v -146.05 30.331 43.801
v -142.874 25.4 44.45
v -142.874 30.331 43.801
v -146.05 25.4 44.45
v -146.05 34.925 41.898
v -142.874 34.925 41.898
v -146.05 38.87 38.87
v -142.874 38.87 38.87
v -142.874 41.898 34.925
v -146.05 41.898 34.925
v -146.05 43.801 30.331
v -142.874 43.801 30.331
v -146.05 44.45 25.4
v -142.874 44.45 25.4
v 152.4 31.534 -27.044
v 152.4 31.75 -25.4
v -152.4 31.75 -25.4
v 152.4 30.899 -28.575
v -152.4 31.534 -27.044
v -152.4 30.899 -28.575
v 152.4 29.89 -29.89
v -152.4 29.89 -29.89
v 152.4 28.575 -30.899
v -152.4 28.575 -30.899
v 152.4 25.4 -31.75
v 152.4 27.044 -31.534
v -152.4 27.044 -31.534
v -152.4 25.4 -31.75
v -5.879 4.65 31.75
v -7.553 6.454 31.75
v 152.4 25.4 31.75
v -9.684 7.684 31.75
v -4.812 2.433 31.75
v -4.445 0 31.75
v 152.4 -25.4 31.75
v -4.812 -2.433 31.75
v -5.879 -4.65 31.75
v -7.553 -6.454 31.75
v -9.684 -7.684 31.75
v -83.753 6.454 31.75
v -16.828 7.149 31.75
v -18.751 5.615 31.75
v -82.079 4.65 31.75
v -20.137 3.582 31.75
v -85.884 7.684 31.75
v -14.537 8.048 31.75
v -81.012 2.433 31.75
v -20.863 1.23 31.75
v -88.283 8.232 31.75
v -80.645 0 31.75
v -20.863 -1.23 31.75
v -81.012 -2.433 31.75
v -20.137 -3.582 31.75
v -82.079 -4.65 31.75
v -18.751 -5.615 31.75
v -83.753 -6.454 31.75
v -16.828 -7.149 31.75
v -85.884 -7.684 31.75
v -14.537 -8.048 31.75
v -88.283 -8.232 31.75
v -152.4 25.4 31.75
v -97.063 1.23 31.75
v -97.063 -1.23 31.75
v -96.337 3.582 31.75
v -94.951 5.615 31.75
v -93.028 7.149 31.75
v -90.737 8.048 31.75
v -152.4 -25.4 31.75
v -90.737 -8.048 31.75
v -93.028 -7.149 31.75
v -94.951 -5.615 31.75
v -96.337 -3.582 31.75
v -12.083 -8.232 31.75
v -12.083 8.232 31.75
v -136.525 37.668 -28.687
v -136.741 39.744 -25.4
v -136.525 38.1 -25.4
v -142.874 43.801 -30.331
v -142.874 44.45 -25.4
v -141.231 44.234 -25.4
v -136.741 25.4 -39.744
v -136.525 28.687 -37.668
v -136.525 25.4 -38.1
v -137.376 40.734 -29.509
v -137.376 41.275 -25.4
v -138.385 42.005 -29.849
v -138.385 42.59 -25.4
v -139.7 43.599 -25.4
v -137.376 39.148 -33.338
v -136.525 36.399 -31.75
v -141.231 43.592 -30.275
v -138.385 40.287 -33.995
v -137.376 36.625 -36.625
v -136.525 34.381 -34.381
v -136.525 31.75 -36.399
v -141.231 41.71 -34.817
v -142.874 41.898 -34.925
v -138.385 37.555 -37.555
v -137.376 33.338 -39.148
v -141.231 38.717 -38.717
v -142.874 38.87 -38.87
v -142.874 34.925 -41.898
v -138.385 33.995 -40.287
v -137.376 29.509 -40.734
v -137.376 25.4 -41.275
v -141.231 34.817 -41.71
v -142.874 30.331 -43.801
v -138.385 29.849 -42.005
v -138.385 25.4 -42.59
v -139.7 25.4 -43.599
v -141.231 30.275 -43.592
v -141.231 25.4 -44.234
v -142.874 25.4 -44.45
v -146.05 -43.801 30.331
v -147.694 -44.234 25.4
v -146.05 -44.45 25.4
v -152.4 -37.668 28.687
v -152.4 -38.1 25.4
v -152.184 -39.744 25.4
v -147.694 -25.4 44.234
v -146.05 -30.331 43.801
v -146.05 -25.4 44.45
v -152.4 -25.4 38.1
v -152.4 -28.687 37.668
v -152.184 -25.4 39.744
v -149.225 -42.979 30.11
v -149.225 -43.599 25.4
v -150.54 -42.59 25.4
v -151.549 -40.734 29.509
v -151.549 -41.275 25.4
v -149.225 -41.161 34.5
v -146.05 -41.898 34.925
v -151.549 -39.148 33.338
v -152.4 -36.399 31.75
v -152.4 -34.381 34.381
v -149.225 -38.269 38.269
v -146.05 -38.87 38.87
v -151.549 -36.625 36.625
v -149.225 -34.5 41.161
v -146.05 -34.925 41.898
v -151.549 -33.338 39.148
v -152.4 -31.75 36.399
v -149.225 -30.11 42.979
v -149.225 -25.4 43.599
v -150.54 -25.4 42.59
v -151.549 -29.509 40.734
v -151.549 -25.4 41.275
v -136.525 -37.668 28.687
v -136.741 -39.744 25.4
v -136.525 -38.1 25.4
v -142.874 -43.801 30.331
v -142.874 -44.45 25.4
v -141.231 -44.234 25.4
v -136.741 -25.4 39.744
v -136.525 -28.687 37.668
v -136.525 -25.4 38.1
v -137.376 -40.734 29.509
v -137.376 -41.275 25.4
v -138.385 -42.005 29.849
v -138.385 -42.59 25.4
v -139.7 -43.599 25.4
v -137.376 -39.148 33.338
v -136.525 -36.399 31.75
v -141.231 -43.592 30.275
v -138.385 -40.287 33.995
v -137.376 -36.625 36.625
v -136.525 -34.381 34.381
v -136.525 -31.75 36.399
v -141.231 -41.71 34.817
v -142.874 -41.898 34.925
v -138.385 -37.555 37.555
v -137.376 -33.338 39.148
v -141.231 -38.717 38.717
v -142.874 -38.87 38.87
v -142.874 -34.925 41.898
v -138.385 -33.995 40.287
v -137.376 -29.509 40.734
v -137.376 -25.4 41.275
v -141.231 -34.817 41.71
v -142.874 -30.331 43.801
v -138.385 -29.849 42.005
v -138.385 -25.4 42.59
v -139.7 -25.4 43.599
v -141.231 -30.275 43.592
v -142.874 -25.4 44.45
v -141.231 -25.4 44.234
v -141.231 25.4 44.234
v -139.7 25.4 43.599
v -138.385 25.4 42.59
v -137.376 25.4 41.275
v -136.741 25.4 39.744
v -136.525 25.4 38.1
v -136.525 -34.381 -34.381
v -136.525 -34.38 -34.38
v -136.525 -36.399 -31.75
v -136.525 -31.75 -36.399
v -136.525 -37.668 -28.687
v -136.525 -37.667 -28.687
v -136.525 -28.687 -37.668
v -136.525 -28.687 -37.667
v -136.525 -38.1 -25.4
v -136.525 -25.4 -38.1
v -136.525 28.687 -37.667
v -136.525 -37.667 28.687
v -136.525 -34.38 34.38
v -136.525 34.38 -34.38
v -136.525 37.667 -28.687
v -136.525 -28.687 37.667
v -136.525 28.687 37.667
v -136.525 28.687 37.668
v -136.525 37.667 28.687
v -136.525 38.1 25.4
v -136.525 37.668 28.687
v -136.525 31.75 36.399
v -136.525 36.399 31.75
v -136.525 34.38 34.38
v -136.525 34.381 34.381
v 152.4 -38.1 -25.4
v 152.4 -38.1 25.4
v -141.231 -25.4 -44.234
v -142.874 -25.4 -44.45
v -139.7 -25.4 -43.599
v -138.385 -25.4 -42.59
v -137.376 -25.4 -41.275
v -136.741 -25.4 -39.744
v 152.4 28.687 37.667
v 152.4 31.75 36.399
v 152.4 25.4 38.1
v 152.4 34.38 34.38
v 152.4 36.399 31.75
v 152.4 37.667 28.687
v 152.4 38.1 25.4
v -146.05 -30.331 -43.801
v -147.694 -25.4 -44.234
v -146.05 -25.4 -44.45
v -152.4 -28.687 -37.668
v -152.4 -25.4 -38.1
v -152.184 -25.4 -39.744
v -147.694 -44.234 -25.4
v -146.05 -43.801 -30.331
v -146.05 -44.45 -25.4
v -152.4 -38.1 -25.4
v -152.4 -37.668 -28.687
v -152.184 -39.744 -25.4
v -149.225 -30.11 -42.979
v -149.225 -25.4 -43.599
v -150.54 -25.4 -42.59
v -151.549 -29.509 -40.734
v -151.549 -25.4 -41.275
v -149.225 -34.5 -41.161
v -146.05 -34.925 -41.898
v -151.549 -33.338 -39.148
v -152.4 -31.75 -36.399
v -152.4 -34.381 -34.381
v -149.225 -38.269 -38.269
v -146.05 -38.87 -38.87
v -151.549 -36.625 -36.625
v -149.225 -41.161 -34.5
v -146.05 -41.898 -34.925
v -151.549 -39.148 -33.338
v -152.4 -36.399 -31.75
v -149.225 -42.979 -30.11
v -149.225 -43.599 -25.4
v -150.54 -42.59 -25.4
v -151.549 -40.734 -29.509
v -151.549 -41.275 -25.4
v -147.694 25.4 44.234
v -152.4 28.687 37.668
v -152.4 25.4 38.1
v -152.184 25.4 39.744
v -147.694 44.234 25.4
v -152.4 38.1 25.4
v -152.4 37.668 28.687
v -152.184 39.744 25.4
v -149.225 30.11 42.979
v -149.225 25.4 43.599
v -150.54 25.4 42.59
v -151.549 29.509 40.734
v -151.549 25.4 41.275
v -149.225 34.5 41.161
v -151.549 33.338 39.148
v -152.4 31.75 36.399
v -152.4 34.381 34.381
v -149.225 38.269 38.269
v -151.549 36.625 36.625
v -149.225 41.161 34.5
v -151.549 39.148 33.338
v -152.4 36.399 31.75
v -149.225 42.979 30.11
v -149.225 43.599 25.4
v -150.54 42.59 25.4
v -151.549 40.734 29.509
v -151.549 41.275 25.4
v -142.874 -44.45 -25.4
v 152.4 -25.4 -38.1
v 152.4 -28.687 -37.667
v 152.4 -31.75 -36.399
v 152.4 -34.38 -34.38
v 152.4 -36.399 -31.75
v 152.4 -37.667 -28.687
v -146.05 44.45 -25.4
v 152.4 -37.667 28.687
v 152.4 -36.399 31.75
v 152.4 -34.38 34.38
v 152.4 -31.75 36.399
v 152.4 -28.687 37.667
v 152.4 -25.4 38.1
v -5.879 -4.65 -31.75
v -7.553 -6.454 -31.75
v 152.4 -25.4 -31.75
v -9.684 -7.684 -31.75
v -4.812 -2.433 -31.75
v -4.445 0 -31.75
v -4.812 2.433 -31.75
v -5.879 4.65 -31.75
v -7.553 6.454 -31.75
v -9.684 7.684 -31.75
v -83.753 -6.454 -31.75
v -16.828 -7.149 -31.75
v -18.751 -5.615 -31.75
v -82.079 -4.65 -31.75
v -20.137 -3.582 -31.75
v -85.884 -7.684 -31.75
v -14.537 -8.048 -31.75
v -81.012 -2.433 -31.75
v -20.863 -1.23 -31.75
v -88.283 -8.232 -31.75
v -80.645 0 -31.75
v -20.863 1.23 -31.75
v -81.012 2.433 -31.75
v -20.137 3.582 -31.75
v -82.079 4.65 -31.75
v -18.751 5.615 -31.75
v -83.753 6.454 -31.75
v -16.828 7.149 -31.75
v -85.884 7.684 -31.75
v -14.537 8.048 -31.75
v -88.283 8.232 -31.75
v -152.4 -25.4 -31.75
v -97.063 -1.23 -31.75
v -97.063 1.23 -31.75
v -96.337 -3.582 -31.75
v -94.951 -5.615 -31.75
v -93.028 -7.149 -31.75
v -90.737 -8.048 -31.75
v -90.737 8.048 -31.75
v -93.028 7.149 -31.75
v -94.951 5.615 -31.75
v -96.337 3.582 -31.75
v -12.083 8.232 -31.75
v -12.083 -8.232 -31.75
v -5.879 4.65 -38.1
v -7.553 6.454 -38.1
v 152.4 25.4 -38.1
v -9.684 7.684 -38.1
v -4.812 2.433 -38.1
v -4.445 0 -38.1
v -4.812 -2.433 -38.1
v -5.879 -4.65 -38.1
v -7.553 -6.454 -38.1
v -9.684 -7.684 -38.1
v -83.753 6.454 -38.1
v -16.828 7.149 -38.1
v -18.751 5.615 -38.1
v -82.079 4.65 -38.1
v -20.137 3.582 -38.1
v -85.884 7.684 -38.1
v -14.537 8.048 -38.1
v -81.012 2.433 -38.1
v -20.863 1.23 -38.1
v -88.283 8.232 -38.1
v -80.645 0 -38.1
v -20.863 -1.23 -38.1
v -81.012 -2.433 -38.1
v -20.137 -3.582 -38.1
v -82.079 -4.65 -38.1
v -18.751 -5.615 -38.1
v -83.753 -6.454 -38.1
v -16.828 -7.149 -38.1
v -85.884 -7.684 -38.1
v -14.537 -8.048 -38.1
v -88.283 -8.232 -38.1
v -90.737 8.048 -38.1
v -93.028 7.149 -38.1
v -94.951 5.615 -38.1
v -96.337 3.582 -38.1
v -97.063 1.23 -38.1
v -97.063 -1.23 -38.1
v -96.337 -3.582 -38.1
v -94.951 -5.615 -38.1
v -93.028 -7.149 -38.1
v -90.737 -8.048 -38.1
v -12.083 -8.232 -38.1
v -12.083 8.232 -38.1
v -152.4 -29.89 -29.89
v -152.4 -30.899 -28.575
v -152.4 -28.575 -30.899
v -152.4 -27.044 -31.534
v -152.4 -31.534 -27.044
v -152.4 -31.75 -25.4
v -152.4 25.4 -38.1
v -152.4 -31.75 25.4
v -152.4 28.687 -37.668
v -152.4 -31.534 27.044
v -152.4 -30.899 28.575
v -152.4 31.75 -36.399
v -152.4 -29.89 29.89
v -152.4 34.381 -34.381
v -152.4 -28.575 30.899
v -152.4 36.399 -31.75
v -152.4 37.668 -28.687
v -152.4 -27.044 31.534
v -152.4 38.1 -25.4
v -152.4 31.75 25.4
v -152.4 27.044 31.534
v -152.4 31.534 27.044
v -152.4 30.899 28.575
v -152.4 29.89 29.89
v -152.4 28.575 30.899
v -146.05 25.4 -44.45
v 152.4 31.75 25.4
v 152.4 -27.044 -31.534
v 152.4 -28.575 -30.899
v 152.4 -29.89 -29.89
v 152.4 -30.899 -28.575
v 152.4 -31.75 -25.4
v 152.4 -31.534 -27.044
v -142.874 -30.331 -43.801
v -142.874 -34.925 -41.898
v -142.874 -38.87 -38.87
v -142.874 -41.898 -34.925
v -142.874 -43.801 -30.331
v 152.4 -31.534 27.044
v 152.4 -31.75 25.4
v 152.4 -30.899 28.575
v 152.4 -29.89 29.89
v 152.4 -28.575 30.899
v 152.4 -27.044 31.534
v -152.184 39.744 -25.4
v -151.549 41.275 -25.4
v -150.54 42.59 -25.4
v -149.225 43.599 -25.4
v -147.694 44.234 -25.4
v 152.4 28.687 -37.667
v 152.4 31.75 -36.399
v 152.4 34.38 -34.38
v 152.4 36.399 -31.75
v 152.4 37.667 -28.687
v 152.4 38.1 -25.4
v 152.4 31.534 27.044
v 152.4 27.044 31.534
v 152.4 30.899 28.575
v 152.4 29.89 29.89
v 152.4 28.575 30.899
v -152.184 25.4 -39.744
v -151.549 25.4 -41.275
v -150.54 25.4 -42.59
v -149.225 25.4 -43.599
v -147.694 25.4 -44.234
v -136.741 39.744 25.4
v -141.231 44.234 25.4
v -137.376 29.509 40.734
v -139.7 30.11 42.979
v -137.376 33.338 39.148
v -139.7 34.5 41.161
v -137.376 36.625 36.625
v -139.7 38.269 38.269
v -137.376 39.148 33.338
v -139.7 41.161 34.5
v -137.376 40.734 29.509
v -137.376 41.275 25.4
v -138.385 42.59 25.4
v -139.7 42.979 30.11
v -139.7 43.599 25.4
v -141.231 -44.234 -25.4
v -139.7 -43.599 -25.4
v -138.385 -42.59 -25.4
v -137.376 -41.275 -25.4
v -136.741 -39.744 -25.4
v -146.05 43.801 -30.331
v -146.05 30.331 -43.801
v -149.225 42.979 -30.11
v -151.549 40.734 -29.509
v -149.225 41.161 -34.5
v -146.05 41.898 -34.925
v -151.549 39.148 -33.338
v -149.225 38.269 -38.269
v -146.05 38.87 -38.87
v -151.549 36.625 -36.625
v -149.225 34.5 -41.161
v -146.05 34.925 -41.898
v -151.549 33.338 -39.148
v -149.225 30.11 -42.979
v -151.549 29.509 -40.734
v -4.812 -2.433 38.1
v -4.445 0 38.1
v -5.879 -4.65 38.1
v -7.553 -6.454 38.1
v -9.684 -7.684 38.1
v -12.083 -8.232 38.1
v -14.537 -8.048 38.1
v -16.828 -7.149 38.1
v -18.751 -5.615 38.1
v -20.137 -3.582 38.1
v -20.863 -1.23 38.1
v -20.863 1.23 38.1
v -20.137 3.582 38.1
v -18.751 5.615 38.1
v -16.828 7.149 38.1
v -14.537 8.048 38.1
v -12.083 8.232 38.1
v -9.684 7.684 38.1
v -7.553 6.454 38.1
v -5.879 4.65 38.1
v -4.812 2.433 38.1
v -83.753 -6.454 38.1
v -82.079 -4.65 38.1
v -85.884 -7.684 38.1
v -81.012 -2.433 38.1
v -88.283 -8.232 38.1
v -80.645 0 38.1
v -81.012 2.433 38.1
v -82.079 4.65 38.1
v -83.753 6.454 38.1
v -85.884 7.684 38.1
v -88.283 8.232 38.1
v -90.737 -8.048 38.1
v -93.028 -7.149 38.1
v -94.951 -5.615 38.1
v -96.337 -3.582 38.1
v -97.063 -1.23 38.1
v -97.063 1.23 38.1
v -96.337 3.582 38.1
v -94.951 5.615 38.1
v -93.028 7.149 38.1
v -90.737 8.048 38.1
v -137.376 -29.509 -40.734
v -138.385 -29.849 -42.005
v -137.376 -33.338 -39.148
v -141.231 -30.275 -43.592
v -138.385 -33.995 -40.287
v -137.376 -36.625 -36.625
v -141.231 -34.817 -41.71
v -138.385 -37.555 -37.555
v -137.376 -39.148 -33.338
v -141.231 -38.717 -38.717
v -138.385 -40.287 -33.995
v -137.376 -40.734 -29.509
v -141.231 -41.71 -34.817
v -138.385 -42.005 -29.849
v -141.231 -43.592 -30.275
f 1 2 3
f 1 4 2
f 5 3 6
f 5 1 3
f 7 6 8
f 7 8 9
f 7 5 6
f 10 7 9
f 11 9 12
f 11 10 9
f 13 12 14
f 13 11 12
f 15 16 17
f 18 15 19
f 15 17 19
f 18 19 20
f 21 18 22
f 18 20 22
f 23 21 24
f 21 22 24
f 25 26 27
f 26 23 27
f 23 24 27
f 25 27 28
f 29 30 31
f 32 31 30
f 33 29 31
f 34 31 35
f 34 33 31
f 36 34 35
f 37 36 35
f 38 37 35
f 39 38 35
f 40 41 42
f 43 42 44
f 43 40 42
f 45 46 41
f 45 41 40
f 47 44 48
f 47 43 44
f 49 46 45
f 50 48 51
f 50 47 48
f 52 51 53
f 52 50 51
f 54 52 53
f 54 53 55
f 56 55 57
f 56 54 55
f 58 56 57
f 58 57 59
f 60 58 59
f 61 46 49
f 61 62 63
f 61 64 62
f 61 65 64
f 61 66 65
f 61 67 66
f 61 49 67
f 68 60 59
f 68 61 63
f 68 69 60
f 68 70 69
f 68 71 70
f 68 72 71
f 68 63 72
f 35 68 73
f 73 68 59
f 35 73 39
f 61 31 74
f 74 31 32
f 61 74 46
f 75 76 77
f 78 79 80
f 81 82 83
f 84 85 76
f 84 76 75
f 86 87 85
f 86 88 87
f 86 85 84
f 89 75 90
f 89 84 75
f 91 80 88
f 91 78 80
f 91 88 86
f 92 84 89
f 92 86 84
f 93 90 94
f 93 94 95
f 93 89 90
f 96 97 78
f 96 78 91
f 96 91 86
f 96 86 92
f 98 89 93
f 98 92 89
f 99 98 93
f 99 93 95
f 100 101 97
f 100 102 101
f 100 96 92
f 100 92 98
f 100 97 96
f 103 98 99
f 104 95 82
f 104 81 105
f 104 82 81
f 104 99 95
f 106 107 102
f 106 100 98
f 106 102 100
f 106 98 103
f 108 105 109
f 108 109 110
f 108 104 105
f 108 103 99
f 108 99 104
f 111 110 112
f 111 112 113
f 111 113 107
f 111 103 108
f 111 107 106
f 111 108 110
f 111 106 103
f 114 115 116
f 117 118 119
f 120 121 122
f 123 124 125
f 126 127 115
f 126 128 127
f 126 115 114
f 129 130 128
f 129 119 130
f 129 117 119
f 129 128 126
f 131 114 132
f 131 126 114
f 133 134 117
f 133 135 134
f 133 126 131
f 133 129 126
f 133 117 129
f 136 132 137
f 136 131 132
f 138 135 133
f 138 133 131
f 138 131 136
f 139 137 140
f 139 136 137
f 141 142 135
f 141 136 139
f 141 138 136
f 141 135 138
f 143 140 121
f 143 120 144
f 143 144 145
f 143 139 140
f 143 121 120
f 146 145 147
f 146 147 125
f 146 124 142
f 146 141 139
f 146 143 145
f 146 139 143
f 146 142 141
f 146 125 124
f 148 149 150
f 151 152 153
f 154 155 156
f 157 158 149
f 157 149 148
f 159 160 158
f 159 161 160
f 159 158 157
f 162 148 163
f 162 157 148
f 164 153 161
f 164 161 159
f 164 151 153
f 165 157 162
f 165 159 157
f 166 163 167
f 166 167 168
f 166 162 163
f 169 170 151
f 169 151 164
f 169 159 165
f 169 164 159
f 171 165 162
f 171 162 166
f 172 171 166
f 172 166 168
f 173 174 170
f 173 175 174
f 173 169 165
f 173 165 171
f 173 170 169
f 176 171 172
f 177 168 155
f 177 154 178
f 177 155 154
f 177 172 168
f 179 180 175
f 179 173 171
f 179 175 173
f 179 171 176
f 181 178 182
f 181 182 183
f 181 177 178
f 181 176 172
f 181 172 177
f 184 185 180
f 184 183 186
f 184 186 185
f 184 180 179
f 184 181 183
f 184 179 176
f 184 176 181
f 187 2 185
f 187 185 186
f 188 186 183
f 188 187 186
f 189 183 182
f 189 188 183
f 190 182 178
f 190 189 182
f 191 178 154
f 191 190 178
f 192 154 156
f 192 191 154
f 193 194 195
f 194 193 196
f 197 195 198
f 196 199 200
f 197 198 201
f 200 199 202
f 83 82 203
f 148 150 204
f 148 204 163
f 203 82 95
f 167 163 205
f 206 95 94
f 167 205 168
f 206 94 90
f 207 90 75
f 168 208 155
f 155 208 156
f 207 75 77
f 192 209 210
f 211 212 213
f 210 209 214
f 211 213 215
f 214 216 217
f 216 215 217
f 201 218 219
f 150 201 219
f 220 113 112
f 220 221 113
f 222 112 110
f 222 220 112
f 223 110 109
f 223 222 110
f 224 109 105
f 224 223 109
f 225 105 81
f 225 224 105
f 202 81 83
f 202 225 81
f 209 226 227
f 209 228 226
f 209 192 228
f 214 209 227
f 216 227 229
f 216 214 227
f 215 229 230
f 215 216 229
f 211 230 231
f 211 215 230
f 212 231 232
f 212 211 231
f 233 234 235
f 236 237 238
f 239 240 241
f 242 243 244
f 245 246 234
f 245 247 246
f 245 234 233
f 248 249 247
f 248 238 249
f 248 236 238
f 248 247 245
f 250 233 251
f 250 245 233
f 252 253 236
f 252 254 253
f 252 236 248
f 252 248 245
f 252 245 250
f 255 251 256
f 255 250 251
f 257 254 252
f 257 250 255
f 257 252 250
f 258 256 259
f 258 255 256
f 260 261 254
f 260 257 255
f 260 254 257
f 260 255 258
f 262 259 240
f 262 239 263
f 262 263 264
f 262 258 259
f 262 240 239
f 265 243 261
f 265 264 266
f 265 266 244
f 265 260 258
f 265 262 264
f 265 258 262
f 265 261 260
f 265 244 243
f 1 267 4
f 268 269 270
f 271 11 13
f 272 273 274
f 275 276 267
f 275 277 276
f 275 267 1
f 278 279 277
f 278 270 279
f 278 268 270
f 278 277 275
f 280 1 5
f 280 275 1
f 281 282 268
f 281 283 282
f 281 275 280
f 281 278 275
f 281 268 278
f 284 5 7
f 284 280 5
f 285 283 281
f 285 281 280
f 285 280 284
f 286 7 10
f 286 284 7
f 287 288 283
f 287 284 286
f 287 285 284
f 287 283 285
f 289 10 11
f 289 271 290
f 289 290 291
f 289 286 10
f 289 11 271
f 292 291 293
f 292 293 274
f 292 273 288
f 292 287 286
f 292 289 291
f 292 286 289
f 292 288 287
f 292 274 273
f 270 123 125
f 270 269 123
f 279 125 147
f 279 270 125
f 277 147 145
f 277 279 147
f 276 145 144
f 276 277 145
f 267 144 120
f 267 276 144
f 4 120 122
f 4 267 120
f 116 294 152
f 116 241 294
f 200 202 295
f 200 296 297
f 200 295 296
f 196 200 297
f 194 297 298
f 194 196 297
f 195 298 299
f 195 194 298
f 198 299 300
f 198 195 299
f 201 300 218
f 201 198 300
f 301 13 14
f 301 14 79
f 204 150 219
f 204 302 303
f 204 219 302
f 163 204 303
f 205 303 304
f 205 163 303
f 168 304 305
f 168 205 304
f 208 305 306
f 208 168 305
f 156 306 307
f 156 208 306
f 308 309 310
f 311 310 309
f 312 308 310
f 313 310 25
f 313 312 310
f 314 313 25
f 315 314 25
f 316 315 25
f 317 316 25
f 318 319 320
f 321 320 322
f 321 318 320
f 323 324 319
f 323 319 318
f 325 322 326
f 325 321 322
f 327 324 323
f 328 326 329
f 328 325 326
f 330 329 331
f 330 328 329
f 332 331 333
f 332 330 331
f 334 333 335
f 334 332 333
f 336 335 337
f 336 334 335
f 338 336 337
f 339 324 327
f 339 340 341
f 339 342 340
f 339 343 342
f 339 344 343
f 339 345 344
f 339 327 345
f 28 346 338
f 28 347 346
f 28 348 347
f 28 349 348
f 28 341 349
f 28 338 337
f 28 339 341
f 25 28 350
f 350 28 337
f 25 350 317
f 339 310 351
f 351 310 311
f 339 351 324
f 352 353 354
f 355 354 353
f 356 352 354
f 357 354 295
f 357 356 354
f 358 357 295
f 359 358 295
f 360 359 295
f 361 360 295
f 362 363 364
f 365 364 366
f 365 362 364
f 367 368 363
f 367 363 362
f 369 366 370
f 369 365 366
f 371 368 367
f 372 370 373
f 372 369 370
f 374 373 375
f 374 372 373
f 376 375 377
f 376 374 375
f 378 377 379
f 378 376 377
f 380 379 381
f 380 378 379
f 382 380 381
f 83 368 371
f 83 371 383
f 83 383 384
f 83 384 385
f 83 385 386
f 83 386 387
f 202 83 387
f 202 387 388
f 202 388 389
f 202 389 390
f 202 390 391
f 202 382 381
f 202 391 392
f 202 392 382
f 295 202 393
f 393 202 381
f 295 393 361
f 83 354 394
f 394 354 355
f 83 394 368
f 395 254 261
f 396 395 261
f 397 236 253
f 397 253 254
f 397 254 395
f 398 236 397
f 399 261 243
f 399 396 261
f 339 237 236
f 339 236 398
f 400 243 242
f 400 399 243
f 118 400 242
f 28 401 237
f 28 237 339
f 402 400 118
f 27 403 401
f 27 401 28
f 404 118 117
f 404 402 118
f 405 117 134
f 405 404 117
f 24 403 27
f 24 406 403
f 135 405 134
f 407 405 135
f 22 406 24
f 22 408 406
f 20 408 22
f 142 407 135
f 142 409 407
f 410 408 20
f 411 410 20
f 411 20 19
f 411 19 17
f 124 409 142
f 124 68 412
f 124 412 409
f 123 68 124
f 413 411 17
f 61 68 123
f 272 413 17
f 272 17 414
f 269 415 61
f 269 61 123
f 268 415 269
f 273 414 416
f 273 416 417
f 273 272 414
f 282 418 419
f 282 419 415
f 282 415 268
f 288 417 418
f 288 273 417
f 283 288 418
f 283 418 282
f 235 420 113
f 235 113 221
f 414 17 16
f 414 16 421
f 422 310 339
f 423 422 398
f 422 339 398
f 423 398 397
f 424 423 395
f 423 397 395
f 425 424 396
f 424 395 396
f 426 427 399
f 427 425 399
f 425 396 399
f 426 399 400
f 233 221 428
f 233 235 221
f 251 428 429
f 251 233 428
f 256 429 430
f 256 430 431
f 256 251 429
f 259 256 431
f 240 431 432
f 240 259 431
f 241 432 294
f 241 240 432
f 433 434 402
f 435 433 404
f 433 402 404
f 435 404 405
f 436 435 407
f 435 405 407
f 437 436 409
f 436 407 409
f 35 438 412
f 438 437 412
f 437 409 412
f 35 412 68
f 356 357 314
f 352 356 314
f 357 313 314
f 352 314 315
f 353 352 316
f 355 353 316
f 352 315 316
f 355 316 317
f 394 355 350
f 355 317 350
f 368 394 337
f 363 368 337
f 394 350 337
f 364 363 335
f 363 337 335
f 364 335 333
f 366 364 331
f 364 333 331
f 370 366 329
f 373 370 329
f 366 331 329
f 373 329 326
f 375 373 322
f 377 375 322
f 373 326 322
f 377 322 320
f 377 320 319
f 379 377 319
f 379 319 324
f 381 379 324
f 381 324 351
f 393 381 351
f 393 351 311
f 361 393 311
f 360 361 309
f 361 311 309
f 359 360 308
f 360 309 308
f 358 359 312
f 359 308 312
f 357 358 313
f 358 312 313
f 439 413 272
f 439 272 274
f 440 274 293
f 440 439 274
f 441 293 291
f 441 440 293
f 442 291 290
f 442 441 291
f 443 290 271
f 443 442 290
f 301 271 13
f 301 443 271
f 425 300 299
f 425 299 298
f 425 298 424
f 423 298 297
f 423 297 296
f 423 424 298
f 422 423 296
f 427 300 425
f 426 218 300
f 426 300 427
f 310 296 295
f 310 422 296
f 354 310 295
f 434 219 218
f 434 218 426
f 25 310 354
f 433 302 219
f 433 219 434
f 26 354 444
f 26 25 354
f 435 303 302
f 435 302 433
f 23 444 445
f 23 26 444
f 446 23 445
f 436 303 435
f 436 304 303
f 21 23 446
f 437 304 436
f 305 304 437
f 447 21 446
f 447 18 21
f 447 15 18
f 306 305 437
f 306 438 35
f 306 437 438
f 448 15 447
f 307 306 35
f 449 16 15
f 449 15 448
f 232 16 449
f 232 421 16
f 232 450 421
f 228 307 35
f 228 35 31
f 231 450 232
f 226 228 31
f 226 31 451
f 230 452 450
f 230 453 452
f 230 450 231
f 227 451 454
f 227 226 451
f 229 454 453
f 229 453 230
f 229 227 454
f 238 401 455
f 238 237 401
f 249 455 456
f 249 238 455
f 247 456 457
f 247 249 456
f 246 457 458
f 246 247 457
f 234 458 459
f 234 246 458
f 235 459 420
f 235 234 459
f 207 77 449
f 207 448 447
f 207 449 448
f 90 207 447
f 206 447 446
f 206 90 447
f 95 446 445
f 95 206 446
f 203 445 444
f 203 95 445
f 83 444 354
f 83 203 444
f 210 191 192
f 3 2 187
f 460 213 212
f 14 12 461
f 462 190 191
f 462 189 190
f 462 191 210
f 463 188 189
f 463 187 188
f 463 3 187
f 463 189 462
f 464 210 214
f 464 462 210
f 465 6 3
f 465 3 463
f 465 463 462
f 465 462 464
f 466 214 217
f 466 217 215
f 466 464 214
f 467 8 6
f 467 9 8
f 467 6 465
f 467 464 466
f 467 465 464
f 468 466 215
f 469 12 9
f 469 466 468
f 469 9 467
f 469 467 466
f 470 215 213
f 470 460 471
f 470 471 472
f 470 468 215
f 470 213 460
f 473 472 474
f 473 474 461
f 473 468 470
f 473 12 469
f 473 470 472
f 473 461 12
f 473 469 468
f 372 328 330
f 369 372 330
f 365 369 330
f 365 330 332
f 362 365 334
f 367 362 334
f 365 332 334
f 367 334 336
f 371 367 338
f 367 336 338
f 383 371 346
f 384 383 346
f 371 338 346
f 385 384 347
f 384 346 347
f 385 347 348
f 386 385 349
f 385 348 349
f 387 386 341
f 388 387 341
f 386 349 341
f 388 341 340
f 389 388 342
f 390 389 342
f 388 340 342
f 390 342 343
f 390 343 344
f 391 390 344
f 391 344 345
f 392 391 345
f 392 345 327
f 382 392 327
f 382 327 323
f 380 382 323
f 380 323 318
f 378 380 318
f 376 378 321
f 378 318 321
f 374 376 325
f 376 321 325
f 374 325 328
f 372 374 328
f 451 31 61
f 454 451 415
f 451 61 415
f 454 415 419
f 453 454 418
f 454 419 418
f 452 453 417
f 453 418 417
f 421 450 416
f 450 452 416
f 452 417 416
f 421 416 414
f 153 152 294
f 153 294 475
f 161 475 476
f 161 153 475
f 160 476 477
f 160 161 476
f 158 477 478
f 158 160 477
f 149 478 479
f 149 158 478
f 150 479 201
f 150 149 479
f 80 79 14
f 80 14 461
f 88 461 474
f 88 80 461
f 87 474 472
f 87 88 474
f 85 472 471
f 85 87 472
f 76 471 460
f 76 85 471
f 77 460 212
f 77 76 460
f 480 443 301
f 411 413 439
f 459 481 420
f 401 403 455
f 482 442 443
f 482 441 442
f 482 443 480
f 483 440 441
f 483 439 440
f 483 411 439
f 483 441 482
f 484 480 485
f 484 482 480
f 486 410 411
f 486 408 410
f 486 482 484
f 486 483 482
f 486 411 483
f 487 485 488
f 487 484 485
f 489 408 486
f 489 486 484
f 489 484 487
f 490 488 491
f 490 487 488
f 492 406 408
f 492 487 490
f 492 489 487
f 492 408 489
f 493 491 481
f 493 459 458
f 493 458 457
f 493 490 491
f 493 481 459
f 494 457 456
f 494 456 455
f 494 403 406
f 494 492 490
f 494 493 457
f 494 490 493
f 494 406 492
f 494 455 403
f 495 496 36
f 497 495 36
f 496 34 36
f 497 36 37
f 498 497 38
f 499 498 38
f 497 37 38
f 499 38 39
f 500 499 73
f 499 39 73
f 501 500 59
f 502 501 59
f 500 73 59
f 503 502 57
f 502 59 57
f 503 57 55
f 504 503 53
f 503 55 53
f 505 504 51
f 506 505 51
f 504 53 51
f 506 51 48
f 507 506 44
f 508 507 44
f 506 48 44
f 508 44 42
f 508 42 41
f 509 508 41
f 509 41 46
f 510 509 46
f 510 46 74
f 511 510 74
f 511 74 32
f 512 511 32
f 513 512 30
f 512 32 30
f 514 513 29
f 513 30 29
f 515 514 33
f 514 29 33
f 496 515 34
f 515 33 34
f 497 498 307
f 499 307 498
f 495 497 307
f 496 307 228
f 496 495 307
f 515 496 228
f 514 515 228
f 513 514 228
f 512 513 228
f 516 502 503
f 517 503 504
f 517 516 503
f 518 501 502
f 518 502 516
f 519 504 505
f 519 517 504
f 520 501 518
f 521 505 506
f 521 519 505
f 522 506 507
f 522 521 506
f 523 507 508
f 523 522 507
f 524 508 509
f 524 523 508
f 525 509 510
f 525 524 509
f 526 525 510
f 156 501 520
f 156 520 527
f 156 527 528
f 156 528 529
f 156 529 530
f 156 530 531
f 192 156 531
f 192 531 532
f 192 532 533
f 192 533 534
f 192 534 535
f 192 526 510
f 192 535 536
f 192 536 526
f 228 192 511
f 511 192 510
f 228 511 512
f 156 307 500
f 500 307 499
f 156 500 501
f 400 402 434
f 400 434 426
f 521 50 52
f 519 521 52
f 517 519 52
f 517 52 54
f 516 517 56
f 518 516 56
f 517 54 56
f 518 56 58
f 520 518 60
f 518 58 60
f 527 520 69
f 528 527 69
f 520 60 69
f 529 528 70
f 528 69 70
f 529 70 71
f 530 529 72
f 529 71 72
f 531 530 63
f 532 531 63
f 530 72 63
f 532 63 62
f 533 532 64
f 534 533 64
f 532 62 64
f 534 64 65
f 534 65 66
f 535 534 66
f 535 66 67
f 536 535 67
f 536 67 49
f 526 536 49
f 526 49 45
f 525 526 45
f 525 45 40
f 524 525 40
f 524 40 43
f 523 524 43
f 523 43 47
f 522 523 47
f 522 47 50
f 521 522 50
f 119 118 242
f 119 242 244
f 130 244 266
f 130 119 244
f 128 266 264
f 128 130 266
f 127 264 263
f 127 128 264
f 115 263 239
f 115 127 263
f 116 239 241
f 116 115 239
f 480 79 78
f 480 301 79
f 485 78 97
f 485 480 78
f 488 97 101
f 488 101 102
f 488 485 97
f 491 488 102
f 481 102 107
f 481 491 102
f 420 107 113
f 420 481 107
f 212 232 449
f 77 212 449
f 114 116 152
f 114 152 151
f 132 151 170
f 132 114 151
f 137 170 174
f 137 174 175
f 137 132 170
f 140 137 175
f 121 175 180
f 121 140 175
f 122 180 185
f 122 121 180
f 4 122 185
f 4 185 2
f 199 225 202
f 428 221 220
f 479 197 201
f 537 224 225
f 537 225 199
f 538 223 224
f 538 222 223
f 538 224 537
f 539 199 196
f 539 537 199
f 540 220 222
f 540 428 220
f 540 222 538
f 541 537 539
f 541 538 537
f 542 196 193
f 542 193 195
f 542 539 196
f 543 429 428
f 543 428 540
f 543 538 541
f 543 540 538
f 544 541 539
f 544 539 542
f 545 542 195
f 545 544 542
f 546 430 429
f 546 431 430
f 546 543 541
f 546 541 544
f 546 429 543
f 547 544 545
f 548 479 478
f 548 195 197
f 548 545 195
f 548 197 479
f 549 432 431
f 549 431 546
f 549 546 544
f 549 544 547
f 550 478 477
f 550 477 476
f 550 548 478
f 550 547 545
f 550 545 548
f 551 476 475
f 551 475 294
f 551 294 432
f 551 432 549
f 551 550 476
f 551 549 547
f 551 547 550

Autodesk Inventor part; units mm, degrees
ref_plane "YZ Plane" through (0, 0, 0) normal (1, 0, 0) x (0, 1, 0)
ref_plane "XZ Plane" through (0, 0, 0) normal (0, 1, 0) x (-1, 0, 0)
ref_plane "XY Plane" through (0, 0, 0) normal (0, 0, 1) x (1, 0, 0)
sketch "Sketch5" plane through (0, 0, 0) normal (1, 0, 0) x (0, 1, 0)
  line L0 (-25.4, 38.1) -> (25.4, 38.1)
  line L1 (38.1, 25.4) -> (38.1, -25.4)
  line L2 (25.4, -38.1) -> (-25.4, -38.1)
  line L3 (-38.1, -25.4) -> (-38.1, 25.4)
  line L4 (-38.1, 38.1) -> (38.1, -38.1) construction
  line L5 (38.1, 38.1) -> (-38.1, -38.1) construction
  arc A0 (38.1, 25.4) -> (25.4, 38.1) centre (25.4, 25.4) ccw
  arc A1 (25.4, -38.1) -> (38.1, -25.4) centre (25.4, -25.4) ccw
  arc A2 (-38.1, -25.4) -> (-25.4, -38.1) centre (-25.4, -25.4) ccw
  arc A3 (-25.4, 38.1) -> (-38.1, 25.4) centre (-25.4, 25.4) ccw
  line L6 (31.75, -25.4) -> (31.75, 25.4)
  arc A4 (31.75, 25.4) -> (25.4, 31.75) centre (25.4, 25.4) ccw
  line L7 (25.4, 31.75) -> (-25.4, 31.75)
  arc A5 (-25.4, 31.75) -> (-31.75, 25.4) centre (-25.4, 25.4) ccw
  line L8 (-31.75, 25.4) -> (-31.75, -25.4)
  arc A6 (-31.75, -25.4) -> (-25.4, -31.75) centre (-25.4, -25.4) ccw
  line L9 (-25.4, -31.75) -> (25.4, -31.75)
  arc A7 (25.4, -31.75) -> (31.75, -25.4) centre (25.4, -25.4) ccw
  point P0 (0, 0)
  dimension "d6" = 76.2
  dimension "d7" = 76.2
  dimension "d8" = 12.7
  dimension "d9" = 6.35
extrude "Extrusion4" add sketch "Sketch5" along normal mid plane 304.8
sketch "Sketch7" plane through (-152.4, 0, 0) normal (-1, 0, 0) x (0, 0, 1)
  arc A0 (-38.1, -25.4) -> (-25.4, -38.1) centre (-25.4, -25.4) ccw projected
  line L0 (-25.4, -38.1) -> (25.4, -38.1) projected
  arc A1 (25.4, -38.1) -> (38.1, -25.4) centre (25.4, -25.4) ccw projected
  line L1 (38.1, -25.4) -> (38.1, 25.4) projected
  arc A2 (38.1, 25.4) -> (25.4, 38.1) centre (25.4, 25.4) ccw projected
  line L2 (25.4, 38.1) -> (-25.4, 38.1) projected
  arc A3 (-25.4, 38.1) -> (-38.1, 25.4) centre (-25.4, 25.4) ccw projected
  line L3 (-38.1, 25.4) -> (-38.1, -25.4) projected
  arc A4 (-44.45, -25.4) -> (-25.4, -44.45) centre (-25.4, -25.4) ccw
  line L4 (-25.4, -44.45) -> (25.4, -44.45)
  arc A5 (25.4, -44.45) -> (44.45, -25.4) centre (25.4, -25.4) ccw
  line L5 (44.45, -25.4) -> (44.45, 25.4)
  arc A6 (44.45, 25.4) -> (25.4, 44.45) centre (25.4, 25.4) ccw
  line L6 (25.4, 44.45) -> (-25.4, 44.45)
  arc A7 (-25.4, 44.45) -> (-44.45, 25.4) centre (-25.4, 25.4) ccw
  line L7 (-44.45, 25.4) -> (-44.45, -25.4)
  point P0 (0, 0)
extrude "Extrusion5" add sketch "Sketch7" against normal blind 15.875
fillet "Fillet1" radius 6.35 16 edges at (-152.4, 38.8704, -38.8704) (-152.4, 0, -44.45) (-152.4, -38.8704, -38.8704) (-152.4, -44.45, 0) (-152.4, -38.8704, 38.8704) (-152.4, 0, 44.45) (-152.4, 38.8704, 38.8704) (-152.4, 44.45, 0) (-136.525, 38.8704, 38.8704) (-136.525, 0, 44.45) (-136.525, -38.8704, 38.8704) (-136.525, -44.45, 0) (-136.525, -38.8704, -38.8704) (-136.525, 0, -44.45) (-136.525, 38.8704, -38.8704) (-136.525, 44.45, 0)
sketch "Sketch8" plane through (0, 0, 0) normal (0, 0, 1) x (1, 0, 0)
  circle A0 centre (-88.9, 0) radius 8.255
  line L0 (-152.4, 25.4) -> (-152.4, -25.4) projected
  point P0 (0, 0)
  dimension "d15" = 63.5
  dimension "d16" = 16.51
extrude "Extrusion6" cut sketch "Sketch8" along normal through all both and the other way through all
pattern_linear "Rectangular Pattern1" count 2 spacing 76.2 along (1, 0, 0) of "Extrusion6"
properties part number "Front Hitch Model-1_Base Tube-2" material "SS304"
